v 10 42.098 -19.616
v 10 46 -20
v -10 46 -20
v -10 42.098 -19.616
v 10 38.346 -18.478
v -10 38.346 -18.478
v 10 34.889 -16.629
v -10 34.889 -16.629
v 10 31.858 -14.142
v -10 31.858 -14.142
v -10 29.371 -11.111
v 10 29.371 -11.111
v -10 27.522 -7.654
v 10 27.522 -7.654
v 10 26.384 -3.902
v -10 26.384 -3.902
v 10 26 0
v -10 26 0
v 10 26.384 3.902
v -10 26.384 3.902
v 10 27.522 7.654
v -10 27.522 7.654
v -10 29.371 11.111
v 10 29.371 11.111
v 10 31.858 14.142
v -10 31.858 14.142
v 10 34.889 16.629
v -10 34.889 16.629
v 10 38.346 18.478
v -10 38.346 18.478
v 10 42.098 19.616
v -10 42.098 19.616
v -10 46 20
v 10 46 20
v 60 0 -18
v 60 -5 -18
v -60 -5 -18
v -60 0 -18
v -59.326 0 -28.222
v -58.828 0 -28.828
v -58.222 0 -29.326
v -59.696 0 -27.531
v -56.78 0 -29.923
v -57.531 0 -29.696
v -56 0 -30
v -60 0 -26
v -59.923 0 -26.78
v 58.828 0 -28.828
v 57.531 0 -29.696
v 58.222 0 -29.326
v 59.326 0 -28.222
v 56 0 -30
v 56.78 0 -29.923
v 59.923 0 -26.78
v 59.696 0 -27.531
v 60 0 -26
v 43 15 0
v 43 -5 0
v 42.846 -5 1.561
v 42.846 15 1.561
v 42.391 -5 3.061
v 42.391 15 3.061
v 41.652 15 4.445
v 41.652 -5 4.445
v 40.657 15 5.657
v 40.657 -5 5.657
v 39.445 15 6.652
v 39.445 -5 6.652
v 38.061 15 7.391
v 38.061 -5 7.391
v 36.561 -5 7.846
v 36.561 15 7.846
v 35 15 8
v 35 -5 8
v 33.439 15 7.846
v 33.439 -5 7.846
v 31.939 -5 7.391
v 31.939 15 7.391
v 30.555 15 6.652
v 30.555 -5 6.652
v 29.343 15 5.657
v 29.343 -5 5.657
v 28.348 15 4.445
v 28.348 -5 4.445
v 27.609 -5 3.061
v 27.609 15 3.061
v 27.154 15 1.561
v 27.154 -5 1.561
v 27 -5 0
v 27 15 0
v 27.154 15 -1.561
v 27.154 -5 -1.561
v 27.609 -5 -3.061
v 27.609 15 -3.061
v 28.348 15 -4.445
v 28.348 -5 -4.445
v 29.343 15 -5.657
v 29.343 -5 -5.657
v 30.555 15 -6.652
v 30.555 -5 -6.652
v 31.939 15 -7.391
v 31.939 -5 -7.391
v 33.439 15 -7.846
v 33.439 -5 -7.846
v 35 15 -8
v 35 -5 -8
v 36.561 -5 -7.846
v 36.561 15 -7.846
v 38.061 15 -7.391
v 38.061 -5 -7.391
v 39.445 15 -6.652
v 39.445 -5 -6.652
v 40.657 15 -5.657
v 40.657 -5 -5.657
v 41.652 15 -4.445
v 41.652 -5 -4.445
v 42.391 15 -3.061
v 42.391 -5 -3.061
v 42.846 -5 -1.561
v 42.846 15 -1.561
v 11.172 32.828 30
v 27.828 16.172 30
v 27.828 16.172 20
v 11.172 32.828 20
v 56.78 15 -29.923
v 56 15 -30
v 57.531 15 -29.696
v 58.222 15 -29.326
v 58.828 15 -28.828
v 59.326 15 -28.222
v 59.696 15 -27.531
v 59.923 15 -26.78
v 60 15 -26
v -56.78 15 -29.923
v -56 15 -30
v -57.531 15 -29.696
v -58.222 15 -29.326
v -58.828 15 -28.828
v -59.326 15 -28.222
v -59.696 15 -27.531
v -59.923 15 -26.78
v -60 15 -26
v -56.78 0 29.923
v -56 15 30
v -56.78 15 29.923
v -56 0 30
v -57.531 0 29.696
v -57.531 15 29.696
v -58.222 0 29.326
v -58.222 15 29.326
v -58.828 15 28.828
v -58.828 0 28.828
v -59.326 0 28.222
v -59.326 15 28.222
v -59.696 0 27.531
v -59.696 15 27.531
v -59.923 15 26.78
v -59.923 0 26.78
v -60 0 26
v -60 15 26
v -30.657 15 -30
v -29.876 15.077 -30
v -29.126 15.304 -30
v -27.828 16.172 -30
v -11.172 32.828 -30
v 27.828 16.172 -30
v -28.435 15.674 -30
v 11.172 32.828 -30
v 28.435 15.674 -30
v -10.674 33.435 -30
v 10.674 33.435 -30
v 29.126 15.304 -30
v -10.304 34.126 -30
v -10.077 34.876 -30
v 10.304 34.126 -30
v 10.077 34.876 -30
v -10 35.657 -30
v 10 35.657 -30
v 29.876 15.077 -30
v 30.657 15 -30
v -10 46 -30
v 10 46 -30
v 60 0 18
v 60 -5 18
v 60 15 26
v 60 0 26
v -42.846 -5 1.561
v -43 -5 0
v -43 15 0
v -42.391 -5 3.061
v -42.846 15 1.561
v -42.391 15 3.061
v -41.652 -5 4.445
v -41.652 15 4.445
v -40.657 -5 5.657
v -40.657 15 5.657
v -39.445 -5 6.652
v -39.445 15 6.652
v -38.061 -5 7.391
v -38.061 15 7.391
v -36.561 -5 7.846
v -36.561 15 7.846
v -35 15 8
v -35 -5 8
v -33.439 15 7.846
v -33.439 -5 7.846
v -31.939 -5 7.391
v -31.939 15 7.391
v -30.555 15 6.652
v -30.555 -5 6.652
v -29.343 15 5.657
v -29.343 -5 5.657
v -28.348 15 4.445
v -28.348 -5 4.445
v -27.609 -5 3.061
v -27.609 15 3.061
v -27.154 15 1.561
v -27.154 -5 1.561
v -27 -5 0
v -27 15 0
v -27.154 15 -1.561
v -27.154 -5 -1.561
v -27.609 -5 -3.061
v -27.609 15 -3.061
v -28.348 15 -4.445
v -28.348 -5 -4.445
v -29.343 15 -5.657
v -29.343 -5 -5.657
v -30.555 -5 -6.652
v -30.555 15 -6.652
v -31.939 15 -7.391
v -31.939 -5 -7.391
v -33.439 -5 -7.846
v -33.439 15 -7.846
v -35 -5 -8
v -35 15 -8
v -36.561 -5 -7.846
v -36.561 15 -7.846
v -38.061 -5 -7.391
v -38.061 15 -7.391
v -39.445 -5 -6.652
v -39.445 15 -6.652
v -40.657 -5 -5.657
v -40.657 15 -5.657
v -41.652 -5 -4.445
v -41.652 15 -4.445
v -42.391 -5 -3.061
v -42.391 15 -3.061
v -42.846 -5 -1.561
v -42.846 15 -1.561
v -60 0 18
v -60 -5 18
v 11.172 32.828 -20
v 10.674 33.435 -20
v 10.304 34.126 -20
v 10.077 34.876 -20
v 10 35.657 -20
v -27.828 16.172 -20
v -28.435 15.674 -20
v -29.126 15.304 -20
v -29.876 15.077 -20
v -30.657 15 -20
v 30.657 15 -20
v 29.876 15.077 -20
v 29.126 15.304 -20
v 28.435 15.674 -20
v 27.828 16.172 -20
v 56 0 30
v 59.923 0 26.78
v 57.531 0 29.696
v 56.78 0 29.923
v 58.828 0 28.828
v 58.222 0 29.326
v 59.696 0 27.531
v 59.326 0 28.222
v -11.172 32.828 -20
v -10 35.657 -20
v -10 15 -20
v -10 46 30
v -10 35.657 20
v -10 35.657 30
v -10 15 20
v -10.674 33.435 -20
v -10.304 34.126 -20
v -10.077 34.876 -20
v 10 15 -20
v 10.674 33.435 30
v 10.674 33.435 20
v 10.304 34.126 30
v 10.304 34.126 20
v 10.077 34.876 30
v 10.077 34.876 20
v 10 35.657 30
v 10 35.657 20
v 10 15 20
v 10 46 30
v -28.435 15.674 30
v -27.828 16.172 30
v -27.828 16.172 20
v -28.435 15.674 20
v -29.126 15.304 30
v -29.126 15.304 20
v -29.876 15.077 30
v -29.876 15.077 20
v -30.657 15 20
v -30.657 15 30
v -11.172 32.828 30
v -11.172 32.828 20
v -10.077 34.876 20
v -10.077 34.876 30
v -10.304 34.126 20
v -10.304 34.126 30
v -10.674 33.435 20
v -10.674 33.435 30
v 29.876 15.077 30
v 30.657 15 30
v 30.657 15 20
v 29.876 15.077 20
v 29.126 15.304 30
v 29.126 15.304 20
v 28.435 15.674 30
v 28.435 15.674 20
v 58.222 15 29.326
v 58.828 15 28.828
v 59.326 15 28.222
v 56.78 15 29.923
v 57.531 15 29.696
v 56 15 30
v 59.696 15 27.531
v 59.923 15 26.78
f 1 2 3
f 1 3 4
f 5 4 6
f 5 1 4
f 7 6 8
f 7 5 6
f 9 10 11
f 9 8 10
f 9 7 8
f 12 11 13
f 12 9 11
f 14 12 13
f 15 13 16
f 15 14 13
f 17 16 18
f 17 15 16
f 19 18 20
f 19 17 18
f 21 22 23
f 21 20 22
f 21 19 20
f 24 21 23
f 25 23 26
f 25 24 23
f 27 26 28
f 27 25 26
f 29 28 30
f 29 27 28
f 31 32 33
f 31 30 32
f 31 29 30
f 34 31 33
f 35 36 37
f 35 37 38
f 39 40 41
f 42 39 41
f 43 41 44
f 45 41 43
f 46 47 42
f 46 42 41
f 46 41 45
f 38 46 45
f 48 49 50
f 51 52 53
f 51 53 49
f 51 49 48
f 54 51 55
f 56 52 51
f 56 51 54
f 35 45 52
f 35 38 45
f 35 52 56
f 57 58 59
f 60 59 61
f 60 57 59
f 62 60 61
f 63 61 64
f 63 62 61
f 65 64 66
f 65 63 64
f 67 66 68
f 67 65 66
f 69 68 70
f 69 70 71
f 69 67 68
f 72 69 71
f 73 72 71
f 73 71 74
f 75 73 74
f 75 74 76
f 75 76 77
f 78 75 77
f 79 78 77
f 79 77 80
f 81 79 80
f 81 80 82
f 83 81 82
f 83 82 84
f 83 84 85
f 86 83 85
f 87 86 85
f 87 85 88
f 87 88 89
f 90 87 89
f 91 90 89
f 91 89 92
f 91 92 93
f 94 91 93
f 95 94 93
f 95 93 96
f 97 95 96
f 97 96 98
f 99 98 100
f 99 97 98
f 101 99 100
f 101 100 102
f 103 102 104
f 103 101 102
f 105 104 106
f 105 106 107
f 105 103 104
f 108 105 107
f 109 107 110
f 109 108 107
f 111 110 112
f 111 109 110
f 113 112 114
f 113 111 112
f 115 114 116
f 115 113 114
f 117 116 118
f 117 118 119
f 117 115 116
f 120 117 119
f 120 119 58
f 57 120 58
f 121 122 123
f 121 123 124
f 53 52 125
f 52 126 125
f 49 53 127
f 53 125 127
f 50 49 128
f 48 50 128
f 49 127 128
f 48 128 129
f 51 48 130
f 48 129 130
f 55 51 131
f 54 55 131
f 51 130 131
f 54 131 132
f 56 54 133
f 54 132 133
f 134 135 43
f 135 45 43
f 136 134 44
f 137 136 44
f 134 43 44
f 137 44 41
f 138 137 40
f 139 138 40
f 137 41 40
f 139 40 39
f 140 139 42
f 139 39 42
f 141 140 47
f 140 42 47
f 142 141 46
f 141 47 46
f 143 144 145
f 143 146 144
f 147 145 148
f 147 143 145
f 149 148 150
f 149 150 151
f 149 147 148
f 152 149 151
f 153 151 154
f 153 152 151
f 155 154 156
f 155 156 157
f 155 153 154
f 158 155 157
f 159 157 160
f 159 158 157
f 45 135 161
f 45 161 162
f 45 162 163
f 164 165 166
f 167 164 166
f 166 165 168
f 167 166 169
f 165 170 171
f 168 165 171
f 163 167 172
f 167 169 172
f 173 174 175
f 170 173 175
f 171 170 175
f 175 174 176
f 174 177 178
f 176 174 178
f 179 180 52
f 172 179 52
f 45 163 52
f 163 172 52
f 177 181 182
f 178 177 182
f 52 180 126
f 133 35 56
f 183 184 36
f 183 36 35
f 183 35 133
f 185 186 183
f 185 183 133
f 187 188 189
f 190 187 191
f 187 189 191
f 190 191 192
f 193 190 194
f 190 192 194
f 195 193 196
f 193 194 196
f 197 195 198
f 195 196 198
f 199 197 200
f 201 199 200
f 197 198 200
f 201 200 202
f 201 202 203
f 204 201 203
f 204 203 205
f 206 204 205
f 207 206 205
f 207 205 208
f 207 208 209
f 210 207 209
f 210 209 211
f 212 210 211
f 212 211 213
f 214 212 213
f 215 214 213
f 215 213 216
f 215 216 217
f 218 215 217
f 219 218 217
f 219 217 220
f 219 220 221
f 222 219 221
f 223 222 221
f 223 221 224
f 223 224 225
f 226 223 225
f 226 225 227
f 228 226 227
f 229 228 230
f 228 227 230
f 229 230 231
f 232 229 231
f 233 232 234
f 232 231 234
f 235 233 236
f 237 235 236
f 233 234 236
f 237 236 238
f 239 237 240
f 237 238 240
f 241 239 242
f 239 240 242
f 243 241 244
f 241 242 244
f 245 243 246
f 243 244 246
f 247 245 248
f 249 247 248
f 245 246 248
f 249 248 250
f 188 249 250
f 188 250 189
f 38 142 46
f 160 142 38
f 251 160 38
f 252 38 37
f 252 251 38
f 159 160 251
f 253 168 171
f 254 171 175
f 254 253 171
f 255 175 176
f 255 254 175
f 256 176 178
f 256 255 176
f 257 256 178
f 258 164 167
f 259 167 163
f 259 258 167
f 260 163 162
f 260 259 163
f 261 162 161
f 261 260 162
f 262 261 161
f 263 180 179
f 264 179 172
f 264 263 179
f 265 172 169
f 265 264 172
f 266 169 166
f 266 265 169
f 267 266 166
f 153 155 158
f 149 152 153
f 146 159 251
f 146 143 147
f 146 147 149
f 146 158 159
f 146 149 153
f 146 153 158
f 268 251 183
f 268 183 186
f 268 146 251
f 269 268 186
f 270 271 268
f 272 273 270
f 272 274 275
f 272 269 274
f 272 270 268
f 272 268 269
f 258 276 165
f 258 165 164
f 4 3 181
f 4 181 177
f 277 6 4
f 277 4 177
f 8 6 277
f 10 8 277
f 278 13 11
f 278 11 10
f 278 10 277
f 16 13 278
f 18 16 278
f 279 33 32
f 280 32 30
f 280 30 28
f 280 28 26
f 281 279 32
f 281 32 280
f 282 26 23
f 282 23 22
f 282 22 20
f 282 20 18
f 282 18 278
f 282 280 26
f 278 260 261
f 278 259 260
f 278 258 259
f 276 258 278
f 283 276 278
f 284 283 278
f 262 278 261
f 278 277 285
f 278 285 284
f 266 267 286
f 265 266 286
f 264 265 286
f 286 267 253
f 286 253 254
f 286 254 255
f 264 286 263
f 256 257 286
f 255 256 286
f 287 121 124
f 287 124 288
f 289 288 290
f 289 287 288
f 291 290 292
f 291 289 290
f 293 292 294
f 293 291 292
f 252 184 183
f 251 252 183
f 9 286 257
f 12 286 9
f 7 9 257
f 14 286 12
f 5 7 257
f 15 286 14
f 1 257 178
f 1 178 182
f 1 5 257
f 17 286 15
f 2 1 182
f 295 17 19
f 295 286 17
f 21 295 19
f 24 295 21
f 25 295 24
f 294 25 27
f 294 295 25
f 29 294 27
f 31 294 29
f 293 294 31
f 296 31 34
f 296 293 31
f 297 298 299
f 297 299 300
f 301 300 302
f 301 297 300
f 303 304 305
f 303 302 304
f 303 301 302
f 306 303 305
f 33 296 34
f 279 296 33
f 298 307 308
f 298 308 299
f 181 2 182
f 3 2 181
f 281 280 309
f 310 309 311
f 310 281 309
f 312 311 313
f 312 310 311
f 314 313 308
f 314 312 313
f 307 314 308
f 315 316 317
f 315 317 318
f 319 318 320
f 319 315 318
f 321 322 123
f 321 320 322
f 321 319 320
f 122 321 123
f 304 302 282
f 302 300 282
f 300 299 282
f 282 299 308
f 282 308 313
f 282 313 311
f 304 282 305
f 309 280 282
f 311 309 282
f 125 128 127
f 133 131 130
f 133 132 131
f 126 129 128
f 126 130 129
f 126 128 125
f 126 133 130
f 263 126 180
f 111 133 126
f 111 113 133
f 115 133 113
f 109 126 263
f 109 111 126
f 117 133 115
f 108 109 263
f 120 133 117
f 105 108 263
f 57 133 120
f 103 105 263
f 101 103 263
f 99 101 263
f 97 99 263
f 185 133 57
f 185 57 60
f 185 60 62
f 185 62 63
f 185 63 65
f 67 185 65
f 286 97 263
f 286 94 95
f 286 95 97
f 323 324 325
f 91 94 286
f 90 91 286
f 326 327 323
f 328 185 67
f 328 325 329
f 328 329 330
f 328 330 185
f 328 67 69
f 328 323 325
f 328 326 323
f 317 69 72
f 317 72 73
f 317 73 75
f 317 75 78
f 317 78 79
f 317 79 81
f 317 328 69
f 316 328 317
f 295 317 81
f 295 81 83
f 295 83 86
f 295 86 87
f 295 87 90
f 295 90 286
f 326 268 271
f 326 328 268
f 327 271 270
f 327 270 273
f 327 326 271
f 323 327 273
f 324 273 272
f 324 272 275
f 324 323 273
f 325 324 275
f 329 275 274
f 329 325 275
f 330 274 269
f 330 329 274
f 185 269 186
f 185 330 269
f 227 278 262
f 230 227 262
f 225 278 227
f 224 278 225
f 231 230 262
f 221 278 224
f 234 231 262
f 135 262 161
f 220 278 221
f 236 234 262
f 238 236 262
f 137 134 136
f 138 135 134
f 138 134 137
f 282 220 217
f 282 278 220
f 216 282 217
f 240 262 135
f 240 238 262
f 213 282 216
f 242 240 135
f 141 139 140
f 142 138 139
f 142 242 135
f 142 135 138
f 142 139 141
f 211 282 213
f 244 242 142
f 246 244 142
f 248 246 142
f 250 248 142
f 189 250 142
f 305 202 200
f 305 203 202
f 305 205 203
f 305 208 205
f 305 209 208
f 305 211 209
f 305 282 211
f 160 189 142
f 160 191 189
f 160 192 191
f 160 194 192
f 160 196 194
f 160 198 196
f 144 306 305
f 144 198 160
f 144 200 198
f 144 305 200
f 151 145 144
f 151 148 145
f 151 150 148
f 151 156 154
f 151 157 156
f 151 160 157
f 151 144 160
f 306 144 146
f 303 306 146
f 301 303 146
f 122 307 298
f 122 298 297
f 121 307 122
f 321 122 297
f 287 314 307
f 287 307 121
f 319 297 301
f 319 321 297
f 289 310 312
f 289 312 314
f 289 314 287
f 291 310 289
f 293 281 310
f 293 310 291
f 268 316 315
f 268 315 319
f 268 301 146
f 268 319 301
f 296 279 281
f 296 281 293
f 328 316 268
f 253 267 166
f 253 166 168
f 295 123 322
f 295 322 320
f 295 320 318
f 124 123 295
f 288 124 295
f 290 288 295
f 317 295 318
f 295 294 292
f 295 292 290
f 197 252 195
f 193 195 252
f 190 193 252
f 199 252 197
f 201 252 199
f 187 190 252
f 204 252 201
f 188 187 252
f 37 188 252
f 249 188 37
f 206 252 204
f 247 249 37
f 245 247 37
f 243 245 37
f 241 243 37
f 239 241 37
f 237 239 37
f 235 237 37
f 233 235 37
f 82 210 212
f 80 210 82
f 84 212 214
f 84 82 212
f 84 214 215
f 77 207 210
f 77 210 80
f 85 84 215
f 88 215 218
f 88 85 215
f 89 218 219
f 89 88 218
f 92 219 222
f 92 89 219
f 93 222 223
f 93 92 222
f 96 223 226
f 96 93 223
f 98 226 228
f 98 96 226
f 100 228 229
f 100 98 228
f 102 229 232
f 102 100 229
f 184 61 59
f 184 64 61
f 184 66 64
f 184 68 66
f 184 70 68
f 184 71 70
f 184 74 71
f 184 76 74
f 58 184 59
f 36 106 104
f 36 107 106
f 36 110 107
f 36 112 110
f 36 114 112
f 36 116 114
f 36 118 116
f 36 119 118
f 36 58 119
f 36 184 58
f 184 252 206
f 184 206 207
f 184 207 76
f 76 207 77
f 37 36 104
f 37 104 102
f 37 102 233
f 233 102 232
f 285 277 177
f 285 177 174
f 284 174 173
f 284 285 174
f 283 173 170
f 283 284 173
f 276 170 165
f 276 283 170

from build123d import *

# Parameters (mm, degrees)
BOSS_EXTRUDE1_DEPTH     = 30
SKETCH2_W               = 36
SKETCH2_H               = 5
BOSS_EXTRUDE2_DEPTH     = 60
FILLET1_R               = 4
SKETCH4_W               = 20.656854249
SKETCH4_H               = 40
CUT_EXTRUDE1_DEPTH      = 31
CUT_EXTRUDE2_REACH      = 75.899
SKETCH3_R               = 8
CUT_EXTRUDE3_DEPTH      = 89.971905678
CUT_EXTRUDE3_DEPTH_BACK = 89.971905678


with BuildPart() as part:
    # Sketch1 → Boss-Extrude1 (new, symmetric)
    with BuildSketch(Plane.XY):
        with BuildLine():
            Line((10, 46), (-10, 46))
            Line((-10, 46), (-10, 35.656854249))
            ThreePointArc((-10, 35.656854249), (-10.30448187, 34.12612052), (-11.171572875, 32.828427125))
            Line((-11.171572875, 32.828427125), (-27.828427125, 16.171572875))
            ThreePointArc((-27.828427125, 16.171572875), (-29.12612052, 15.30448187), (-30.656854249, 15))
            Line((-30.656854249, 15), (-60, 15))
            Line((-60, 15), (-60, 0))
            Line((-60, 0), (60, 0))
            Line((60, 0), (60, 15))
            Line((60, 15), (30.656854249, 15))
            ThreePointArc((30.656854249, 15), (29.12612052, 15.30448187), (27.828427125, 16.171572875))
            Line((27.828427125, 16.171572875), (11.171572875, 32.828427125))
            ThreePointArc((11.171572875, 32.828427125), (10.30448187, 34.12612052), (10, 35.656854249))
            Line((10, 35.656854249), (10, 46))
        make_face()
    extrude(amount=BOSS_EXTRUDE1_DEPTH, both=True)

    # Sketch2 → Boss-Extrude2 (add, symmetric)
    with BuildSketch(Plane(origin=(0, 0, 0), x_dir=(0, 0, -1), z_dir=(1, 0, 0))):
        with Locations((0, -2.5)):
            Rectangle(SKETCH2_W, SKETCH2_H)
    extrude(amount=BOSS_EXTRUDE2_DEPTH, both=True)

    # Fillet1
    fillet1_edges = [part.edges().sort_by_distance(p)[0] for p in [
        (-60, 7.5, 30),
        (60, 7.5, -30),
        (-60, 7.5, -30),
        (60, 7.5, 30),
    ]]
    fillet(fillet1_edges, radius=FILLET1_R)

    # Sketch4 → Cut-Extrude1 (cut)
    with BuildSketch(Plane(origin=(0, 46, 0), x_dir=(1, 0, 0), z_dir=(0, 1, 0))):
        with Locations((-20.328427125, 0)):
            Rectangle(SKETCH4_W, SKETCH4_H)
    cut_extrude1 = extrude(amount=-CUT_EXTRUDE1_DEPTH, mode=Mode.SUBTRACT)

    # Sketch3 → Cut-Extrude2 (cut, up to next)
    with BuildSketch(Plane(origin=(0, 15, 0), x_dir=(1, 0, 0), z_dir=(0, 1, 0)), mode=Mode.PRIVATE) as cut_extrude2_sk1:
        with Locations(Location((-35, 0, 0), (0, 0, 180))):
            Circle(SKETCH3_R)
    cut_extrude2_tool1 = extrude(cut_extrude2_sk1.sketch, amount=-CUT_EXTRUDE2_REACH, mode=Mode.PRIVATE) & part.part
    cut_extrude2 = cut_extrude2_tool1.solids().sort_by_distance((-35, 15, 0))[0]
    add(cut_extrude2, mode=Mode.SUBTRACT)

    # Mirror1: Cut-Extrude1, Cut-Extrude2 across plane
    add(cut_extrude1.mirror(Plane(origin=(0, 0, 0), x_dir=(0, 0, 1), z_dir=(1, 0, 0))), mode=Mode.SUBTRACT)
    add(cut_extrude2.mirror(Plane(origin=(0, 0, 0), x_dir=(0, 0, 1), z_dir=(1, 0, 0))), mode=Mode.SUBTRACT)

    # Sketch5 → Cut-Extrude3 (cut, two sides: drawn at the far end of the back side and taken through both)
    with BuildSketch(Plane.ZY.offset(10).offset(-CUT_EXTRUDE3_DEPTH_BACK)):
        with BuildLine():
            Line((-20, 198.842570685), (-20, 46))
            ThreePointArc((-20, 46), (0, 26), (20, 46))
            Line((20, 46), (20, 198.842570685))
            Line((20, 198.842570685), (20, 504.527712056))
            Line((20, 504.527712056), (-20, 504.527712056))
            Line((-20, 504.527712056), (-20, 198.842570685))
        make_face()
    extrude(amount=CUT_EXTRUDE3_DEPTH + CUT_EXTRUDE3_DEPTH_BACK, mode=Mode.SUBTRACT)


solid = part.part
